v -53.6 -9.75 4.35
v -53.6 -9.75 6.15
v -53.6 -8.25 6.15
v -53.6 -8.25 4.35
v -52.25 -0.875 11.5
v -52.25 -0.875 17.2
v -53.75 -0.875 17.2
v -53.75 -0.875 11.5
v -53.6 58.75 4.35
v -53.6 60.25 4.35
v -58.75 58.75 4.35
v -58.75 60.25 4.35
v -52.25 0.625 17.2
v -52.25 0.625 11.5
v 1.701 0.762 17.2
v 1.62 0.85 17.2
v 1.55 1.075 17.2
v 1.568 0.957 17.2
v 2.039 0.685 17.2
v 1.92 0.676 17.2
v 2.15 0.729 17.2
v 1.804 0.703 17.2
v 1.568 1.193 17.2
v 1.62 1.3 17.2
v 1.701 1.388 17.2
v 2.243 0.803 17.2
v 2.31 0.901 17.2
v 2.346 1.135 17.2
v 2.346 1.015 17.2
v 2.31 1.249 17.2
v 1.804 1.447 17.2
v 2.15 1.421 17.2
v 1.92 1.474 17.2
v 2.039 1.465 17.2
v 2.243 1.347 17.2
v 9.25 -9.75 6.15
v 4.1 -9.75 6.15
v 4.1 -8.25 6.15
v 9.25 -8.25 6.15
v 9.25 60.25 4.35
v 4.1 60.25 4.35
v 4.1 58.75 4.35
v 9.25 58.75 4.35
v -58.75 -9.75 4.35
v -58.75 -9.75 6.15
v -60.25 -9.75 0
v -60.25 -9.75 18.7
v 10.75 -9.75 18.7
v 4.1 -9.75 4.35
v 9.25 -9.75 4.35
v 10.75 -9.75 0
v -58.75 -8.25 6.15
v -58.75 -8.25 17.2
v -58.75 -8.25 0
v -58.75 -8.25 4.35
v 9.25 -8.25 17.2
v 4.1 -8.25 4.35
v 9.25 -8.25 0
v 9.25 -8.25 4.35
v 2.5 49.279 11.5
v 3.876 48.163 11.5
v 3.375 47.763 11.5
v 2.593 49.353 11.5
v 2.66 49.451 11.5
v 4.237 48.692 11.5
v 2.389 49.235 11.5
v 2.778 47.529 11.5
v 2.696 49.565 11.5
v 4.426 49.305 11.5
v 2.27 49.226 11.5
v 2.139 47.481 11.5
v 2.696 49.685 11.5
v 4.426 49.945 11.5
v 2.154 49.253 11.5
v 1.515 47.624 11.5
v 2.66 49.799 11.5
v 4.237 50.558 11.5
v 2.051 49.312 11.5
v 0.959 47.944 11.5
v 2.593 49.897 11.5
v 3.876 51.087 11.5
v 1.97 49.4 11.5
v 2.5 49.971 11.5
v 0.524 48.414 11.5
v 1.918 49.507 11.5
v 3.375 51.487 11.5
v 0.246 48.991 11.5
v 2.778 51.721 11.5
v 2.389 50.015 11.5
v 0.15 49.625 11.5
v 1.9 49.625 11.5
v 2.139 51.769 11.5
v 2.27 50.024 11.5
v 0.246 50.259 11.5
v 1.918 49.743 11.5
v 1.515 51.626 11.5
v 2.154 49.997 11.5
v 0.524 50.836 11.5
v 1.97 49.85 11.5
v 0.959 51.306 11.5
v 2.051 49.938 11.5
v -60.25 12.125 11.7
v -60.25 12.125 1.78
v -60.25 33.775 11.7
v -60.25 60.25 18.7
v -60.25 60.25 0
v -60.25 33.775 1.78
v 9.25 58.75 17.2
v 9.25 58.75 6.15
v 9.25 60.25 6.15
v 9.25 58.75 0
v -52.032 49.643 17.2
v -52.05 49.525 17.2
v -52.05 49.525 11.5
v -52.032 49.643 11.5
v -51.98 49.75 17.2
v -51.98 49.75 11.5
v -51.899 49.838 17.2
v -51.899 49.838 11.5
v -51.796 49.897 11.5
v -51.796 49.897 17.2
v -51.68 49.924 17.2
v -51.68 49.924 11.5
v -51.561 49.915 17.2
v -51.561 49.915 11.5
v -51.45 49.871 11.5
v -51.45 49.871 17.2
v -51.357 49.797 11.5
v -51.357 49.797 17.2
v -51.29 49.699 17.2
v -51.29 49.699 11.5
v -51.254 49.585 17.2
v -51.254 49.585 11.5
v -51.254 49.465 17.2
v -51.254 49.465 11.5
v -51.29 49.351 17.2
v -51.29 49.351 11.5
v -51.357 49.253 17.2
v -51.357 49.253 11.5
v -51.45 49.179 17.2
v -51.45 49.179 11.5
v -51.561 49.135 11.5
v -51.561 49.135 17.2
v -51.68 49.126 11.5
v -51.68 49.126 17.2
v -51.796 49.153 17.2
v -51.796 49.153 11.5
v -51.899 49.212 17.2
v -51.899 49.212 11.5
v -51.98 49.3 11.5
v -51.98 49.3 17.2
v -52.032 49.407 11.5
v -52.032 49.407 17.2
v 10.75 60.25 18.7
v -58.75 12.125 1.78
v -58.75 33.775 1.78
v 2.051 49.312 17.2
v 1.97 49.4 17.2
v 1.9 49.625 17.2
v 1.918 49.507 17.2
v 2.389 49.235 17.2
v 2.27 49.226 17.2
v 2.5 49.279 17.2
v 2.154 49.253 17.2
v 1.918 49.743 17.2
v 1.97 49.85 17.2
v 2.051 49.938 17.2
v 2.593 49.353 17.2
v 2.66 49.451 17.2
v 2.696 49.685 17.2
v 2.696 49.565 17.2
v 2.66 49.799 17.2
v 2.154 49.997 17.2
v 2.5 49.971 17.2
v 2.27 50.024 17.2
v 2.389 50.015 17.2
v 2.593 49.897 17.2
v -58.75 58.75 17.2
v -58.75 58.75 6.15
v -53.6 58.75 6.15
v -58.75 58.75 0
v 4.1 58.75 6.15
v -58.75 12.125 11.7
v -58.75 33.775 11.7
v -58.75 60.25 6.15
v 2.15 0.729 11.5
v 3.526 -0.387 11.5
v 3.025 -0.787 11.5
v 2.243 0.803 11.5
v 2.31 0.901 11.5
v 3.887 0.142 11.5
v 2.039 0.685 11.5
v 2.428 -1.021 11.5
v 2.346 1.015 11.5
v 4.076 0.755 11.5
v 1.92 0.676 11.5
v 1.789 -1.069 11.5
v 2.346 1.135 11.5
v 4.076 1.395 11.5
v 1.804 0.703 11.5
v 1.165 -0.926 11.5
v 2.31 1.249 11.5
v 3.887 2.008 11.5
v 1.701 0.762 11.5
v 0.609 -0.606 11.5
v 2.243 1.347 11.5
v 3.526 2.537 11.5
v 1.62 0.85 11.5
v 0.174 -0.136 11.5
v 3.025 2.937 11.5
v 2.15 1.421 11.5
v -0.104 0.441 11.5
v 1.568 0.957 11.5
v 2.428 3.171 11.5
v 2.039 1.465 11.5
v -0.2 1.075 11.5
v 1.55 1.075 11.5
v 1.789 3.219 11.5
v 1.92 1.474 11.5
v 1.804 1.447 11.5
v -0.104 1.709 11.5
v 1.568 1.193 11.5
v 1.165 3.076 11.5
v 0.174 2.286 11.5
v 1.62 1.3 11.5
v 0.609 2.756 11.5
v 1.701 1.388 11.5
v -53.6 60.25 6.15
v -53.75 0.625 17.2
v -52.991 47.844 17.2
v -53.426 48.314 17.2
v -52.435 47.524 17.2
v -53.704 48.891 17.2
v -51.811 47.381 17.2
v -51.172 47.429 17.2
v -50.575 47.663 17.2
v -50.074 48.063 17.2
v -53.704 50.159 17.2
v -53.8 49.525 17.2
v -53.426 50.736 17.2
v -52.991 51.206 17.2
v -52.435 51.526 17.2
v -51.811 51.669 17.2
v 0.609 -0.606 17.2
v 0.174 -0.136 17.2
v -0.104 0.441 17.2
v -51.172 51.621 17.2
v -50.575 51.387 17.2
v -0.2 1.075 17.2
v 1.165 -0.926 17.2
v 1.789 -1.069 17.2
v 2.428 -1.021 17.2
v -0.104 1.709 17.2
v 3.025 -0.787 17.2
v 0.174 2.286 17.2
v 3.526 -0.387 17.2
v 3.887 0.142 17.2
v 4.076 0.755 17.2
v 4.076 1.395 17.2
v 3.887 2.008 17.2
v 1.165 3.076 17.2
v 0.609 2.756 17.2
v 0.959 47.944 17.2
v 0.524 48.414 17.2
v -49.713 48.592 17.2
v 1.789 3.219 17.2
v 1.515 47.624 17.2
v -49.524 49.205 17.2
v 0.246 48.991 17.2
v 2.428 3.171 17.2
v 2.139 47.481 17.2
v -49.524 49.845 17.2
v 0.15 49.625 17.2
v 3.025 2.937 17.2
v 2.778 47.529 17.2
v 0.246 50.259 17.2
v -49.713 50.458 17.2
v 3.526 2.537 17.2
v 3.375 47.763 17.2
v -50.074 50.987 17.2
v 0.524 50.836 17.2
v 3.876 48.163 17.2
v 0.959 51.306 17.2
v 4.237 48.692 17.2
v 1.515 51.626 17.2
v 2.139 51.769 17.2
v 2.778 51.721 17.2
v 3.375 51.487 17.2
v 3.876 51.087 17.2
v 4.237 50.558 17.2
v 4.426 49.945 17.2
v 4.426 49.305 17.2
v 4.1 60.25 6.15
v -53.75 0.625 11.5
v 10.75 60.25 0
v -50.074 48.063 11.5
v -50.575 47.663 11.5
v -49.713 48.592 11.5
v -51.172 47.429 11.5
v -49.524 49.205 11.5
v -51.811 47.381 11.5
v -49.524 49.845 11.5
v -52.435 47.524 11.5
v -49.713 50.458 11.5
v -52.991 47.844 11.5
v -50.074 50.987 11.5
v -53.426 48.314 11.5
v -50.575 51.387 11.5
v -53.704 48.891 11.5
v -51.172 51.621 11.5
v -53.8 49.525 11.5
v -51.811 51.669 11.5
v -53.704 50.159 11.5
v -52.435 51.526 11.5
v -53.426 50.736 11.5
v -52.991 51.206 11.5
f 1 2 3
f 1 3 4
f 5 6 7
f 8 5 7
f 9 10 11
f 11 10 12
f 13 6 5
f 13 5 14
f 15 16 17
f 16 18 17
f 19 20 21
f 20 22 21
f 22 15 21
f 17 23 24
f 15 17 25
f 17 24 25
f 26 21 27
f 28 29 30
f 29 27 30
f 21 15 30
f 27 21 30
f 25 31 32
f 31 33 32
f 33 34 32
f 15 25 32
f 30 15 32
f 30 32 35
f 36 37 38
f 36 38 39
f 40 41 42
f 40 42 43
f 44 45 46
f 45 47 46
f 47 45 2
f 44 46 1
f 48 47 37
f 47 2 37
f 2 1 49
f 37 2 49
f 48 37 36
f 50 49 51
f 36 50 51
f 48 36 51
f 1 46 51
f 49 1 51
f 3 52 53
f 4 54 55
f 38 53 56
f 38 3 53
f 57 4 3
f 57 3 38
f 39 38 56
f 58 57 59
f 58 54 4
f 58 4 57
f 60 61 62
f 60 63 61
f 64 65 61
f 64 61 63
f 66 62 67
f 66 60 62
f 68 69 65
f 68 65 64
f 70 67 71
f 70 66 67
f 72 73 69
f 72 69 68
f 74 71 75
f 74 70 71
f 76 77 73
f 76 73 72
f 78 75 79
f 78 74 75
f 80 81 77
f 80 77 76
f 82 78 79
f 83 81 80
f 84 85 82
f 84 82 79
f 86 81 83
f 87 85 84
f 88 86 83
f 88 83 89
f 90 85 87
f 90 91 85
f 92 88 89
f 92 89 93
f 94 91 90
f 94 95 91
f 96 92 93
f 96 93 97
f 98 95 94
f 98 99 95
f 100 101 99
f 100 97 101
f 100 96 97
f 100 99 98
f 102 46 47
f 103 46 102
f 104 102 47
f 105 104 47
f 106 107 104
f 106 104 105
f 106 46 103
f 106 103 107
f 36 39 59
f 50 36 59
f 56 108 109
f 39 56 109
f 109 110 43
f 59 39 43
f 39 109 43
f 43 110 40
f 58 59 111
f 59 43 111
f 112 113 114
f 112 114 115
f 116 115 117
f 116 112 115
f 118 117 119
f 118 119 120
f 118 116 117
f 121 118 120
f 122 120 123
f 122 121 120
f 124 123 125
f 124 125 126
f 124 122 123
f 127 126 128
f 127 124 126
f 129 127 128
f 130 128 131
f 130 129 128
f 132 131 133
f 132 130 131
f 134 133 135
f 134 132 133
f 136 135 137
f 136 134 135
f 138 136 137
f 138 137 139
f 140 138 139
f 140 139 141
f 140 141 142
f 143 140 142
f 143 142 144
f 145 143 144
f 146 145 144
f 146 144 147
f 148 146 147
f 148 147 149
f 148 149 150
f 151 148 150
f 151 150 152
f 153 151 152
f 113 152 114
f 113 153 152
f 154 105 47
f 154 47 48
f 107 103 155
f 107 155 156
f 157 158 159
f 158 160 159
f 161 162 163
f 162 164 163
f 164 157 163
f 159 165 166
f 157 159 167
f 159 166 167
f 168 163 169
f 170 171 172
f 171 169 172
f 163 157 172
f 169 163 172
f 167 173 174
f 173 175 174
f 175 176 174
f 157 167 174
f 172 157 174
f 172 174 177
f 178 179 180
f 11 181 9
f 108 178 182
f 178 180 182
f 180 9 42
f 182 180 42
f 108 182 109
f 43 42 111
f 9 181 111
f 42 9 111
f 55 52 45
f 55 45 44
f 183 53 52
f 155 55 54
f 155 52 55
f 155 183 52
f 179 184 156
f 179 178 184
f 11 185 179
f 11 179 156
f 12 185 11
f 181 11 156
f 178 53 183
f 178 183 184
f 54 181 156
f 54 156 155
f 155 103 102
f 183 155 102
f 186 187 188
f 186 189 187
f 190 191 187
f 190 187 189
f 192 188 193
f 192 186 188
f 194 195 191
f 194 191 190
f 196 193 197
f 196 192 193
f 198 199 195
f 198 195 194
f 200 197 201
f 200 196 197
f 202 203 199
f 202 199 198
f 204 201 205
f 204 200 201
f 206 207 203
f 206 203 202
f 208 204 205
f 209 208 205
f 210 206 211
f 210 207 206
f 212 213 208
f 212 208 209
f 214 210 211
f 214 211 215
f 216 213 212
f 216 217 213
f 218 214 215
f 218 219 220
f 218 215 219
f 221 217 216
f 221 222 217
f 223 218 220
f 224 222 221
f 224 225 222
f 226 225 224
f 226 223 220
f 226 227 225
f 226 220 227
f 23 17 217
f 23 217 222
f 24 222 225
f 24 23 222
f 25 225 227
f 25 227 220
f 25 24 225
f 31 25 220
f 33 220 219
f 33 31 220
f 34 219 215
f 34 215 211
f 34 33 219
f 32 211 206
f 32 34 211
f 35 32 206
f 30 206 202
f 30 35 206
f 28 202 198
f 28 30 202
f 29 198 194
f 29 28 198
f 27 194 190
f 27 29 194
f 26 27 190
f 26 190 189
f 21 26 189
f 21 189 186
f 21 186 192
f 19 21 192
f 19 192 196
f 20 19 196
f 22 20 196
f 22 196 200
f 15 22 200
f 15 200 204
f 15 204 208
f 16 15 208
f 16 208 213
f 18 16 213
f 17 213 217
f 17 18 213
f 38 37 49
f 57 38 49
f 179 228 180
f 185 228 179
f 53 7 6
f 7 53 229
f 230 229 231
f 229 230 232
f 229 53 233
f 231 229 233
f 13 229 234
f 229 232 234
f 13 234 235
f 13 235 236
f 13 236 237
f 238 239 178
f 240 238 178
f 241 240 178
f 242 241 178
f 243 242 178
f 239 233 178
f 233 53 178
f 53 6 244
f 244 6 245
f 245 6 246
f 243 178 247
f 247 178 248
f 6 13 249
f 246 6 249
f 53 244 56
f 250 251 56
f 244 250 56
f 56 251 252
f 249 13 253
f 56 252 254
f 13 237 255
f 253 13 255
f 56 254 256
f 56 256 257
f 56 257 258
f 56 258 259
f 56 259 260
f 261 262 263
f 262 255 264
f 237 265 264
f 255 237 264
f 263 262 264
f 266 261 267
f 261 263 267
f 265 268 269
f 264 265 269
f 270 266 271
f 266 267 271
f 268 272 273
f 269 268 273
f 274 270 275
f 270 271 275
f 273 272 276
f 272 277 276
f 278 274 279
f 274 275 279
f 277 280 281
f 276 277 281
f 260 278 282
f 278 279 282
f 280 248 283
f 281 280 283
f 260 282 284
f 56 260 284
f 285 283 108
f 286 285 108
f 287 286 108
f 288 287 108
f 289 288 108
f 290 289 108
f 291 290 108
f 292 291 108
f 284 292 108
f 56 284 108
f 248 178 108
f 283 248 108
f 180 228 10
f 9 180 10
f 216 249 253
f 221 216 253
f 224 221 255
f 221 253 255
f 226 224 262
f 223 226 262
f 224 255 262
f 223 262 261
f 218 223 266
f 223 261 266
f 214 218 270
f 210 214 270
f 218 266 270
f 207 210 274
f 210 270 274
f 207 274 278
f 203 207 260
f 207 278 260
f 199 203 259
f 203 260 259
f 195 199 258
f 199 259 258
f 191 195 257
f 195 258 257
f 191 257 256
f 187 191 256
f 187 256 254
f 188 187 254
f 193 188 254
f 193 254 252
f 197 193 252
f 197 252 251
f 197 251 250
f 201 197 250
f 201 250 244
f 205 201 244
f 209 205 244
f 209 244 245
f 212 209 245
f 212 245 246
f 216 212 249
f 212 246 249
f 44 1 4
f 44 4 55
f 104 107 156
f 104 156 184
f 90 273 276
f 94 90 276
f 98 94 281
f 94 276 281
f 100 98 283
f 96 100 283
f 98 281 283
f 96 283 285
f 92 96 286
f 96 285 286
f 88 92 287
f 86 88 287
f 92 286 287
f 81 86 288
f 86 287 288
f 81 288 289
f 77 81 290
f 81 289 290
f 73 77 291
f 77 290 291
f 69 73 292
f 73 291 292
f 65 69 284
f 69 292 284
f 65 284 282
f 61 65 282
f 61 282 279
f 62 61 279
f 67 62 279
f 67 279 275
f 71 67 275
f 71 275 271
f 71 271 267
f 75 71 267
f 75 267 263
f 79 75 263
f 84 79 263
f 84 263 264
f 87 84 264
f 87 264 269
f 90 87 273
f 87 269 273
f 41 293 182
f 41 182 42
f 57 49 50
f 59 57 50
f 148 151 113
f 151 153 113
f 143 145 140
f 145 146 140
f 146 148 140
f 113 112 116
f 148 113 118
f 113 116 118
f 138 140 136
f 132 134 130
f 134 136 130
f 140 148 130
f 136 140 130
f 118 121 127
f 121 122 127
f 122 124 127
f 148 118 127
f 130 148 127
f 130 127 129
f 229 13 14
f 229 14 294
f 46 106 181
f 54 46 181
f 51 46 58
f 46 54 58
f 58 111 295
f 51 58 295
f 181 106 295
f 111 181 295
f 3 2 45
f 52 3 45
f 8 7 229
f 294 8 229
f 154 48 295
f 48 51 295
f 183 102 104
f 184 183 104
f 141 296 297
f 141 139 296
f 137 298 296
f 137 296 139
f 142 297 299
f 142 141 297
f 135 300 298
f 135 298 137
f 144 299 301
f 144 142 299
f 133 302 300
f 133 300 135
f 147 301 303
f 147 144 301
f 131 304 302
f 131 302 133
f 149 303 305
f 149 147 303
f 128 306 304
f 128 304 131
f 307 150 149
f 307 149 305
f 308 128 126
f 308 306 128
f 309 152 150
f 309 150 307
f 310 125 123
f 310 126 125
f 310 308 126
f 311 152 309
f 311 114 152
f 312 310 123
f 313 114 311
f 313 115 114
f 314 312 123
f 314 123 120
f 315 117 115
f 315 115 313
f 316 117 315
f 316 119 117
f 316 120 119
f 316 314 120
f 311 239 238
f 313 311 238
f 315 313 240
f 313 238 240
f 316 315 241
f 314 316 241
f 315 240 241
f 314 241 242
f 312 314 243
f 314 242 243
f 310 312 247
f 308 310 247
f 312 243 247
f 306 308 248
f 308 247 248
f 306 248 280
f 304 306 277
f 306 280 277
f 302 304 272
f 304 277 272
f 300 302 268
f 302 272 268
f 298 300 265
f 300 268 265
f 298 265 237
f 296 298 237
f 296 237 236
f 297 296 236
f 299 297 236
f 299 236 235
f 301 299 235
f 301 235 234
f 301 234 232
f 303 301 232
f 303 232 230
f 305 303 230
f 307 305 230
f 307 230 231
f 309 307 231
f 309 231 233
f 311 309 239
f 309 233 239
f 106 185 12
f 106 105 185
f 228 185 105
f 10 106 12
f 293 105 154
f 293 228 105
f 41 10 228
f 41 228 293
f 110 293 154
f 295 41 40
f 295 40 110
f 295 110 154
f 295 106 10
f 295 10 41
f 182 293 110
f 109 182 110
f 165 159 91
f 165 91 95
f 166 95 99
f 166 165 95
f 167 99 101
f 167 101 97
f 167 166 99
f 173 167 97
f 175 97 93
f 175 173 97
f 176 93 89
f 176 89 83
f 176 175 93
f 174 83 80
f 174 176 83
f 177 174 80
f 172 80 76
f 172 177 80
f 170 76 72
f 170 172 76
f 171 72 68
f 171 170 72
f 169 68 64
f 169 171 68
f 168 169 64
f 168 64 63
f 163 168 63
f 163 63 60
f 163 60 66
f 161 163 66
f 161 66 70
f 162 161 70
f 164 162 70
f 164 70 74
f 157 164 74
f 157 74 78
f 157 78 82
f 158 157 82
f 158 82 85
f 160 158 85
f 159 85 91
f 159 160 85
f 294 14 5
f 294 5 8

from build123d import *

# Parameters (mm, degrees)
SKETCH1_W               = 71
SKETCH1_H               = 70
SKETCH1_W_2             = 68
SKETCH1_H_2             = 67
BOSS_EXTRUDE1_DEPTH     = 17.2
BOSS_EXTRUDE2_START     = 17.2
SKETCH1_2_W             = 71
SKETCH1_2_H             = 70
BOSS_EXTRUDE2_DEPTH     = 1.5
CUT_EXTRUDE1_REACH      = 96.232
SKETCH6_W               = 5.15
SKETCH6_H               = 1.8
MIRROR2_COPY_1_REACH    = 96.232
MIRROR2_COPY_1_SKETCH_W = 5.15
MIRROR2_COPY_1_SKETCH_H = 1.8
CUT_EXTRUDE2_REACH      = 96.978
SKETCH7_W               = 9.92
SKETCH7_H               = 21.65
SKETCH8_R               = 2.15
SKETCH8_R_2             = 0.4
SKETCH8_W               = 1.5
SKETCH8_H               = 1.5
BOSS_EXTRUDE6_DEPTH     = 5.7


with BuildPart() as part:
    # Sketch1 → Boss-Extrude1 (new body)
    with BuildSketch(Plane.XY):
        with Locations((-24.75, 25.25)):
            Rectangle(SKETCH1_W, SKETCH1_H)
        with Locations((-24.75, 25.25)):
            Rectangle(SKETCH1_W_2, SKETCH1_H_2, mode=Mode.SUBTRACT)
    extrude(amount=BOSS_EXTRUDE1_DEPTH)

    # Sketch1<2> → Boss-Extrude2 (add)
    with BuildSketch(Plane.XY.offset(BOSS_EXTRUDE2_START)):
        with Locations((-24.75, 25.25)):
            Rectangle(SKETCH1_2_W, SKETCH1_2_H)
    extrude(amount=BOSS_EXTRUDE2_DEPTH)

    # Sketch6 → Cut-Extrude1 (cut, up to next)
    with BuildSketch(Plane(origin=(0, 60.25, 0), x_dir=(1, 0, 0), z_dir=(0, 1, 0)), mode=Mode.PRIVATE) as cut_extrude1_sk1:
        with Locations((6.675, -5.25)):
            Rectangle(SKETCH6_W, SKETCH6_H)
    cut_extrude1_tool1 = extrude(cut_extrude1_sk1.sketch, amount=-CUT_EXTRUDE1_REACH, mode=Mode.PRIVATE) & part.part
    cut_extrude1 = cut_extrude1_tool1.solids().sort_by_distance((6.675, 60.25, 5.25))[0]
    add(cut_extrude1, mode=Mode.SUBTRACT)

    # Mirror1: Cut-Extrude1 across plane
    add(cut_extrude1.mirror(Plane(origin=(-24.75, 0, 0), x_dir=(0, 0, 1), z_dir=(1, 0, 0))), mode=Mode.SUBTRACT)

    # Mirror2: Cut-Extrude1 across plane
    add(cut_extrude1.mirror(Plane.ZX.offset(25.25)), mode=Mode.SUBTRACT)

    # Mirror2 copy 1 sketch → Mirror2 copy 1 (cut, up to next)
    with BuildSketch(Plane(origin=(-49.5, -9.75, 0), x_dir=(-1, 0, 0), z_dir=(0, -1, 0)), mode=Mode.PRIVATE) as mirror2_copy_1_sk1:
        with Locations((6.675, -5.25)):
            Rectangle(MIRROR2_COPY_1_SKETCH_W, MIRROR2_COPY_1_SKETCH_H)
    mirror2_copy_1_tool1 = extrude(mirror2_copy_1_sk1.sketch, amount=-MIRROR2_COPY_1_REACH, mode=Mode.PRIVATE) & part.part
    add(mirror2_copy_1_tool1.solids().sort_by_distance((-56.175, -9.75, 5.25))[0], mode=Mode.SUBTRACT)

    # Sketch7 → Cut-Extrude2 (cut, up to next)
    with BuildSketch(Plane.ZY.offset(60.25), mode=Mode.PRIVATE) as cut_extrude2_sk1:
        with Locations((6.74, 22.95)):
            Rectangle(SKETCH7_W, SKETCH7_H)
    cut_extrude2_tool1 = extrude(cut_extrude2_sk1.sketch, amount=-CUT_EXTRUDE2_REACH, mode=Mode.PRIVATE) & part.part
    add(cut_extrude2_tool1.solids().sort_by_distance((-60.25, 22.95, 6.74))[0], mode=Mode.SUBTRACT)

    # Sketch8 → Boss-Extrude6 (add)
    # profile 1 of 4: a face of its own
    with BuildSketch(Plane(origin=(0, 0, 17.2), x_dir=(-1, 0, 0), z_dir=(0, 0, -1))):
        with Locations((51.65, 49.525)):
            Circle(SKETCH8_R)
        with Locations((51.65, 49.525)):
            Circle(SKETCH8_R_2, mode=Mode.SUBTRACT)
    # profile 2 of 4: a face of its own
    with BuildSketch(Plane(origin=(0, 0, 17.2), x_dir=(-1, 0, 0), z_dir=(0, 0, -1))):
        with Locations((-2.3, 49.625)):
            Circle(SKETCH8_R)
        with Locations((-2.3, 49.625)):
            Circle(SKETCH8_R_2, mode=Mode.SUBTRACT)
    # profile 3 of 4: a face of its own
    with BuildSketch(Plane(origin=(0, 0, 17.2), x_dir=(-1, 0, 0), z_dir=(0, 0, -1))):
        with Locations((-1.95, 1.075)):
            Circle(SKETCH8_R)
        with Locations((-1.95, 1.075)):
            Circle(SKETCH8_R_2, mode=Mode.SUBTRACT)
    # profile 4 of 4: a face of its own
    with BuildSketch(Plane(origin=(0, 0, 17.2), x_dir=(-1, 0, 0), z_dir=(0, 0, -1))):
        with Locations((53, -0.125)):
            Rectangle(SKETCH8_W, SKETCH8_H)
    extrude(amount=BOSS_EXTRUDE6_DEPTH)


solid = part.part
